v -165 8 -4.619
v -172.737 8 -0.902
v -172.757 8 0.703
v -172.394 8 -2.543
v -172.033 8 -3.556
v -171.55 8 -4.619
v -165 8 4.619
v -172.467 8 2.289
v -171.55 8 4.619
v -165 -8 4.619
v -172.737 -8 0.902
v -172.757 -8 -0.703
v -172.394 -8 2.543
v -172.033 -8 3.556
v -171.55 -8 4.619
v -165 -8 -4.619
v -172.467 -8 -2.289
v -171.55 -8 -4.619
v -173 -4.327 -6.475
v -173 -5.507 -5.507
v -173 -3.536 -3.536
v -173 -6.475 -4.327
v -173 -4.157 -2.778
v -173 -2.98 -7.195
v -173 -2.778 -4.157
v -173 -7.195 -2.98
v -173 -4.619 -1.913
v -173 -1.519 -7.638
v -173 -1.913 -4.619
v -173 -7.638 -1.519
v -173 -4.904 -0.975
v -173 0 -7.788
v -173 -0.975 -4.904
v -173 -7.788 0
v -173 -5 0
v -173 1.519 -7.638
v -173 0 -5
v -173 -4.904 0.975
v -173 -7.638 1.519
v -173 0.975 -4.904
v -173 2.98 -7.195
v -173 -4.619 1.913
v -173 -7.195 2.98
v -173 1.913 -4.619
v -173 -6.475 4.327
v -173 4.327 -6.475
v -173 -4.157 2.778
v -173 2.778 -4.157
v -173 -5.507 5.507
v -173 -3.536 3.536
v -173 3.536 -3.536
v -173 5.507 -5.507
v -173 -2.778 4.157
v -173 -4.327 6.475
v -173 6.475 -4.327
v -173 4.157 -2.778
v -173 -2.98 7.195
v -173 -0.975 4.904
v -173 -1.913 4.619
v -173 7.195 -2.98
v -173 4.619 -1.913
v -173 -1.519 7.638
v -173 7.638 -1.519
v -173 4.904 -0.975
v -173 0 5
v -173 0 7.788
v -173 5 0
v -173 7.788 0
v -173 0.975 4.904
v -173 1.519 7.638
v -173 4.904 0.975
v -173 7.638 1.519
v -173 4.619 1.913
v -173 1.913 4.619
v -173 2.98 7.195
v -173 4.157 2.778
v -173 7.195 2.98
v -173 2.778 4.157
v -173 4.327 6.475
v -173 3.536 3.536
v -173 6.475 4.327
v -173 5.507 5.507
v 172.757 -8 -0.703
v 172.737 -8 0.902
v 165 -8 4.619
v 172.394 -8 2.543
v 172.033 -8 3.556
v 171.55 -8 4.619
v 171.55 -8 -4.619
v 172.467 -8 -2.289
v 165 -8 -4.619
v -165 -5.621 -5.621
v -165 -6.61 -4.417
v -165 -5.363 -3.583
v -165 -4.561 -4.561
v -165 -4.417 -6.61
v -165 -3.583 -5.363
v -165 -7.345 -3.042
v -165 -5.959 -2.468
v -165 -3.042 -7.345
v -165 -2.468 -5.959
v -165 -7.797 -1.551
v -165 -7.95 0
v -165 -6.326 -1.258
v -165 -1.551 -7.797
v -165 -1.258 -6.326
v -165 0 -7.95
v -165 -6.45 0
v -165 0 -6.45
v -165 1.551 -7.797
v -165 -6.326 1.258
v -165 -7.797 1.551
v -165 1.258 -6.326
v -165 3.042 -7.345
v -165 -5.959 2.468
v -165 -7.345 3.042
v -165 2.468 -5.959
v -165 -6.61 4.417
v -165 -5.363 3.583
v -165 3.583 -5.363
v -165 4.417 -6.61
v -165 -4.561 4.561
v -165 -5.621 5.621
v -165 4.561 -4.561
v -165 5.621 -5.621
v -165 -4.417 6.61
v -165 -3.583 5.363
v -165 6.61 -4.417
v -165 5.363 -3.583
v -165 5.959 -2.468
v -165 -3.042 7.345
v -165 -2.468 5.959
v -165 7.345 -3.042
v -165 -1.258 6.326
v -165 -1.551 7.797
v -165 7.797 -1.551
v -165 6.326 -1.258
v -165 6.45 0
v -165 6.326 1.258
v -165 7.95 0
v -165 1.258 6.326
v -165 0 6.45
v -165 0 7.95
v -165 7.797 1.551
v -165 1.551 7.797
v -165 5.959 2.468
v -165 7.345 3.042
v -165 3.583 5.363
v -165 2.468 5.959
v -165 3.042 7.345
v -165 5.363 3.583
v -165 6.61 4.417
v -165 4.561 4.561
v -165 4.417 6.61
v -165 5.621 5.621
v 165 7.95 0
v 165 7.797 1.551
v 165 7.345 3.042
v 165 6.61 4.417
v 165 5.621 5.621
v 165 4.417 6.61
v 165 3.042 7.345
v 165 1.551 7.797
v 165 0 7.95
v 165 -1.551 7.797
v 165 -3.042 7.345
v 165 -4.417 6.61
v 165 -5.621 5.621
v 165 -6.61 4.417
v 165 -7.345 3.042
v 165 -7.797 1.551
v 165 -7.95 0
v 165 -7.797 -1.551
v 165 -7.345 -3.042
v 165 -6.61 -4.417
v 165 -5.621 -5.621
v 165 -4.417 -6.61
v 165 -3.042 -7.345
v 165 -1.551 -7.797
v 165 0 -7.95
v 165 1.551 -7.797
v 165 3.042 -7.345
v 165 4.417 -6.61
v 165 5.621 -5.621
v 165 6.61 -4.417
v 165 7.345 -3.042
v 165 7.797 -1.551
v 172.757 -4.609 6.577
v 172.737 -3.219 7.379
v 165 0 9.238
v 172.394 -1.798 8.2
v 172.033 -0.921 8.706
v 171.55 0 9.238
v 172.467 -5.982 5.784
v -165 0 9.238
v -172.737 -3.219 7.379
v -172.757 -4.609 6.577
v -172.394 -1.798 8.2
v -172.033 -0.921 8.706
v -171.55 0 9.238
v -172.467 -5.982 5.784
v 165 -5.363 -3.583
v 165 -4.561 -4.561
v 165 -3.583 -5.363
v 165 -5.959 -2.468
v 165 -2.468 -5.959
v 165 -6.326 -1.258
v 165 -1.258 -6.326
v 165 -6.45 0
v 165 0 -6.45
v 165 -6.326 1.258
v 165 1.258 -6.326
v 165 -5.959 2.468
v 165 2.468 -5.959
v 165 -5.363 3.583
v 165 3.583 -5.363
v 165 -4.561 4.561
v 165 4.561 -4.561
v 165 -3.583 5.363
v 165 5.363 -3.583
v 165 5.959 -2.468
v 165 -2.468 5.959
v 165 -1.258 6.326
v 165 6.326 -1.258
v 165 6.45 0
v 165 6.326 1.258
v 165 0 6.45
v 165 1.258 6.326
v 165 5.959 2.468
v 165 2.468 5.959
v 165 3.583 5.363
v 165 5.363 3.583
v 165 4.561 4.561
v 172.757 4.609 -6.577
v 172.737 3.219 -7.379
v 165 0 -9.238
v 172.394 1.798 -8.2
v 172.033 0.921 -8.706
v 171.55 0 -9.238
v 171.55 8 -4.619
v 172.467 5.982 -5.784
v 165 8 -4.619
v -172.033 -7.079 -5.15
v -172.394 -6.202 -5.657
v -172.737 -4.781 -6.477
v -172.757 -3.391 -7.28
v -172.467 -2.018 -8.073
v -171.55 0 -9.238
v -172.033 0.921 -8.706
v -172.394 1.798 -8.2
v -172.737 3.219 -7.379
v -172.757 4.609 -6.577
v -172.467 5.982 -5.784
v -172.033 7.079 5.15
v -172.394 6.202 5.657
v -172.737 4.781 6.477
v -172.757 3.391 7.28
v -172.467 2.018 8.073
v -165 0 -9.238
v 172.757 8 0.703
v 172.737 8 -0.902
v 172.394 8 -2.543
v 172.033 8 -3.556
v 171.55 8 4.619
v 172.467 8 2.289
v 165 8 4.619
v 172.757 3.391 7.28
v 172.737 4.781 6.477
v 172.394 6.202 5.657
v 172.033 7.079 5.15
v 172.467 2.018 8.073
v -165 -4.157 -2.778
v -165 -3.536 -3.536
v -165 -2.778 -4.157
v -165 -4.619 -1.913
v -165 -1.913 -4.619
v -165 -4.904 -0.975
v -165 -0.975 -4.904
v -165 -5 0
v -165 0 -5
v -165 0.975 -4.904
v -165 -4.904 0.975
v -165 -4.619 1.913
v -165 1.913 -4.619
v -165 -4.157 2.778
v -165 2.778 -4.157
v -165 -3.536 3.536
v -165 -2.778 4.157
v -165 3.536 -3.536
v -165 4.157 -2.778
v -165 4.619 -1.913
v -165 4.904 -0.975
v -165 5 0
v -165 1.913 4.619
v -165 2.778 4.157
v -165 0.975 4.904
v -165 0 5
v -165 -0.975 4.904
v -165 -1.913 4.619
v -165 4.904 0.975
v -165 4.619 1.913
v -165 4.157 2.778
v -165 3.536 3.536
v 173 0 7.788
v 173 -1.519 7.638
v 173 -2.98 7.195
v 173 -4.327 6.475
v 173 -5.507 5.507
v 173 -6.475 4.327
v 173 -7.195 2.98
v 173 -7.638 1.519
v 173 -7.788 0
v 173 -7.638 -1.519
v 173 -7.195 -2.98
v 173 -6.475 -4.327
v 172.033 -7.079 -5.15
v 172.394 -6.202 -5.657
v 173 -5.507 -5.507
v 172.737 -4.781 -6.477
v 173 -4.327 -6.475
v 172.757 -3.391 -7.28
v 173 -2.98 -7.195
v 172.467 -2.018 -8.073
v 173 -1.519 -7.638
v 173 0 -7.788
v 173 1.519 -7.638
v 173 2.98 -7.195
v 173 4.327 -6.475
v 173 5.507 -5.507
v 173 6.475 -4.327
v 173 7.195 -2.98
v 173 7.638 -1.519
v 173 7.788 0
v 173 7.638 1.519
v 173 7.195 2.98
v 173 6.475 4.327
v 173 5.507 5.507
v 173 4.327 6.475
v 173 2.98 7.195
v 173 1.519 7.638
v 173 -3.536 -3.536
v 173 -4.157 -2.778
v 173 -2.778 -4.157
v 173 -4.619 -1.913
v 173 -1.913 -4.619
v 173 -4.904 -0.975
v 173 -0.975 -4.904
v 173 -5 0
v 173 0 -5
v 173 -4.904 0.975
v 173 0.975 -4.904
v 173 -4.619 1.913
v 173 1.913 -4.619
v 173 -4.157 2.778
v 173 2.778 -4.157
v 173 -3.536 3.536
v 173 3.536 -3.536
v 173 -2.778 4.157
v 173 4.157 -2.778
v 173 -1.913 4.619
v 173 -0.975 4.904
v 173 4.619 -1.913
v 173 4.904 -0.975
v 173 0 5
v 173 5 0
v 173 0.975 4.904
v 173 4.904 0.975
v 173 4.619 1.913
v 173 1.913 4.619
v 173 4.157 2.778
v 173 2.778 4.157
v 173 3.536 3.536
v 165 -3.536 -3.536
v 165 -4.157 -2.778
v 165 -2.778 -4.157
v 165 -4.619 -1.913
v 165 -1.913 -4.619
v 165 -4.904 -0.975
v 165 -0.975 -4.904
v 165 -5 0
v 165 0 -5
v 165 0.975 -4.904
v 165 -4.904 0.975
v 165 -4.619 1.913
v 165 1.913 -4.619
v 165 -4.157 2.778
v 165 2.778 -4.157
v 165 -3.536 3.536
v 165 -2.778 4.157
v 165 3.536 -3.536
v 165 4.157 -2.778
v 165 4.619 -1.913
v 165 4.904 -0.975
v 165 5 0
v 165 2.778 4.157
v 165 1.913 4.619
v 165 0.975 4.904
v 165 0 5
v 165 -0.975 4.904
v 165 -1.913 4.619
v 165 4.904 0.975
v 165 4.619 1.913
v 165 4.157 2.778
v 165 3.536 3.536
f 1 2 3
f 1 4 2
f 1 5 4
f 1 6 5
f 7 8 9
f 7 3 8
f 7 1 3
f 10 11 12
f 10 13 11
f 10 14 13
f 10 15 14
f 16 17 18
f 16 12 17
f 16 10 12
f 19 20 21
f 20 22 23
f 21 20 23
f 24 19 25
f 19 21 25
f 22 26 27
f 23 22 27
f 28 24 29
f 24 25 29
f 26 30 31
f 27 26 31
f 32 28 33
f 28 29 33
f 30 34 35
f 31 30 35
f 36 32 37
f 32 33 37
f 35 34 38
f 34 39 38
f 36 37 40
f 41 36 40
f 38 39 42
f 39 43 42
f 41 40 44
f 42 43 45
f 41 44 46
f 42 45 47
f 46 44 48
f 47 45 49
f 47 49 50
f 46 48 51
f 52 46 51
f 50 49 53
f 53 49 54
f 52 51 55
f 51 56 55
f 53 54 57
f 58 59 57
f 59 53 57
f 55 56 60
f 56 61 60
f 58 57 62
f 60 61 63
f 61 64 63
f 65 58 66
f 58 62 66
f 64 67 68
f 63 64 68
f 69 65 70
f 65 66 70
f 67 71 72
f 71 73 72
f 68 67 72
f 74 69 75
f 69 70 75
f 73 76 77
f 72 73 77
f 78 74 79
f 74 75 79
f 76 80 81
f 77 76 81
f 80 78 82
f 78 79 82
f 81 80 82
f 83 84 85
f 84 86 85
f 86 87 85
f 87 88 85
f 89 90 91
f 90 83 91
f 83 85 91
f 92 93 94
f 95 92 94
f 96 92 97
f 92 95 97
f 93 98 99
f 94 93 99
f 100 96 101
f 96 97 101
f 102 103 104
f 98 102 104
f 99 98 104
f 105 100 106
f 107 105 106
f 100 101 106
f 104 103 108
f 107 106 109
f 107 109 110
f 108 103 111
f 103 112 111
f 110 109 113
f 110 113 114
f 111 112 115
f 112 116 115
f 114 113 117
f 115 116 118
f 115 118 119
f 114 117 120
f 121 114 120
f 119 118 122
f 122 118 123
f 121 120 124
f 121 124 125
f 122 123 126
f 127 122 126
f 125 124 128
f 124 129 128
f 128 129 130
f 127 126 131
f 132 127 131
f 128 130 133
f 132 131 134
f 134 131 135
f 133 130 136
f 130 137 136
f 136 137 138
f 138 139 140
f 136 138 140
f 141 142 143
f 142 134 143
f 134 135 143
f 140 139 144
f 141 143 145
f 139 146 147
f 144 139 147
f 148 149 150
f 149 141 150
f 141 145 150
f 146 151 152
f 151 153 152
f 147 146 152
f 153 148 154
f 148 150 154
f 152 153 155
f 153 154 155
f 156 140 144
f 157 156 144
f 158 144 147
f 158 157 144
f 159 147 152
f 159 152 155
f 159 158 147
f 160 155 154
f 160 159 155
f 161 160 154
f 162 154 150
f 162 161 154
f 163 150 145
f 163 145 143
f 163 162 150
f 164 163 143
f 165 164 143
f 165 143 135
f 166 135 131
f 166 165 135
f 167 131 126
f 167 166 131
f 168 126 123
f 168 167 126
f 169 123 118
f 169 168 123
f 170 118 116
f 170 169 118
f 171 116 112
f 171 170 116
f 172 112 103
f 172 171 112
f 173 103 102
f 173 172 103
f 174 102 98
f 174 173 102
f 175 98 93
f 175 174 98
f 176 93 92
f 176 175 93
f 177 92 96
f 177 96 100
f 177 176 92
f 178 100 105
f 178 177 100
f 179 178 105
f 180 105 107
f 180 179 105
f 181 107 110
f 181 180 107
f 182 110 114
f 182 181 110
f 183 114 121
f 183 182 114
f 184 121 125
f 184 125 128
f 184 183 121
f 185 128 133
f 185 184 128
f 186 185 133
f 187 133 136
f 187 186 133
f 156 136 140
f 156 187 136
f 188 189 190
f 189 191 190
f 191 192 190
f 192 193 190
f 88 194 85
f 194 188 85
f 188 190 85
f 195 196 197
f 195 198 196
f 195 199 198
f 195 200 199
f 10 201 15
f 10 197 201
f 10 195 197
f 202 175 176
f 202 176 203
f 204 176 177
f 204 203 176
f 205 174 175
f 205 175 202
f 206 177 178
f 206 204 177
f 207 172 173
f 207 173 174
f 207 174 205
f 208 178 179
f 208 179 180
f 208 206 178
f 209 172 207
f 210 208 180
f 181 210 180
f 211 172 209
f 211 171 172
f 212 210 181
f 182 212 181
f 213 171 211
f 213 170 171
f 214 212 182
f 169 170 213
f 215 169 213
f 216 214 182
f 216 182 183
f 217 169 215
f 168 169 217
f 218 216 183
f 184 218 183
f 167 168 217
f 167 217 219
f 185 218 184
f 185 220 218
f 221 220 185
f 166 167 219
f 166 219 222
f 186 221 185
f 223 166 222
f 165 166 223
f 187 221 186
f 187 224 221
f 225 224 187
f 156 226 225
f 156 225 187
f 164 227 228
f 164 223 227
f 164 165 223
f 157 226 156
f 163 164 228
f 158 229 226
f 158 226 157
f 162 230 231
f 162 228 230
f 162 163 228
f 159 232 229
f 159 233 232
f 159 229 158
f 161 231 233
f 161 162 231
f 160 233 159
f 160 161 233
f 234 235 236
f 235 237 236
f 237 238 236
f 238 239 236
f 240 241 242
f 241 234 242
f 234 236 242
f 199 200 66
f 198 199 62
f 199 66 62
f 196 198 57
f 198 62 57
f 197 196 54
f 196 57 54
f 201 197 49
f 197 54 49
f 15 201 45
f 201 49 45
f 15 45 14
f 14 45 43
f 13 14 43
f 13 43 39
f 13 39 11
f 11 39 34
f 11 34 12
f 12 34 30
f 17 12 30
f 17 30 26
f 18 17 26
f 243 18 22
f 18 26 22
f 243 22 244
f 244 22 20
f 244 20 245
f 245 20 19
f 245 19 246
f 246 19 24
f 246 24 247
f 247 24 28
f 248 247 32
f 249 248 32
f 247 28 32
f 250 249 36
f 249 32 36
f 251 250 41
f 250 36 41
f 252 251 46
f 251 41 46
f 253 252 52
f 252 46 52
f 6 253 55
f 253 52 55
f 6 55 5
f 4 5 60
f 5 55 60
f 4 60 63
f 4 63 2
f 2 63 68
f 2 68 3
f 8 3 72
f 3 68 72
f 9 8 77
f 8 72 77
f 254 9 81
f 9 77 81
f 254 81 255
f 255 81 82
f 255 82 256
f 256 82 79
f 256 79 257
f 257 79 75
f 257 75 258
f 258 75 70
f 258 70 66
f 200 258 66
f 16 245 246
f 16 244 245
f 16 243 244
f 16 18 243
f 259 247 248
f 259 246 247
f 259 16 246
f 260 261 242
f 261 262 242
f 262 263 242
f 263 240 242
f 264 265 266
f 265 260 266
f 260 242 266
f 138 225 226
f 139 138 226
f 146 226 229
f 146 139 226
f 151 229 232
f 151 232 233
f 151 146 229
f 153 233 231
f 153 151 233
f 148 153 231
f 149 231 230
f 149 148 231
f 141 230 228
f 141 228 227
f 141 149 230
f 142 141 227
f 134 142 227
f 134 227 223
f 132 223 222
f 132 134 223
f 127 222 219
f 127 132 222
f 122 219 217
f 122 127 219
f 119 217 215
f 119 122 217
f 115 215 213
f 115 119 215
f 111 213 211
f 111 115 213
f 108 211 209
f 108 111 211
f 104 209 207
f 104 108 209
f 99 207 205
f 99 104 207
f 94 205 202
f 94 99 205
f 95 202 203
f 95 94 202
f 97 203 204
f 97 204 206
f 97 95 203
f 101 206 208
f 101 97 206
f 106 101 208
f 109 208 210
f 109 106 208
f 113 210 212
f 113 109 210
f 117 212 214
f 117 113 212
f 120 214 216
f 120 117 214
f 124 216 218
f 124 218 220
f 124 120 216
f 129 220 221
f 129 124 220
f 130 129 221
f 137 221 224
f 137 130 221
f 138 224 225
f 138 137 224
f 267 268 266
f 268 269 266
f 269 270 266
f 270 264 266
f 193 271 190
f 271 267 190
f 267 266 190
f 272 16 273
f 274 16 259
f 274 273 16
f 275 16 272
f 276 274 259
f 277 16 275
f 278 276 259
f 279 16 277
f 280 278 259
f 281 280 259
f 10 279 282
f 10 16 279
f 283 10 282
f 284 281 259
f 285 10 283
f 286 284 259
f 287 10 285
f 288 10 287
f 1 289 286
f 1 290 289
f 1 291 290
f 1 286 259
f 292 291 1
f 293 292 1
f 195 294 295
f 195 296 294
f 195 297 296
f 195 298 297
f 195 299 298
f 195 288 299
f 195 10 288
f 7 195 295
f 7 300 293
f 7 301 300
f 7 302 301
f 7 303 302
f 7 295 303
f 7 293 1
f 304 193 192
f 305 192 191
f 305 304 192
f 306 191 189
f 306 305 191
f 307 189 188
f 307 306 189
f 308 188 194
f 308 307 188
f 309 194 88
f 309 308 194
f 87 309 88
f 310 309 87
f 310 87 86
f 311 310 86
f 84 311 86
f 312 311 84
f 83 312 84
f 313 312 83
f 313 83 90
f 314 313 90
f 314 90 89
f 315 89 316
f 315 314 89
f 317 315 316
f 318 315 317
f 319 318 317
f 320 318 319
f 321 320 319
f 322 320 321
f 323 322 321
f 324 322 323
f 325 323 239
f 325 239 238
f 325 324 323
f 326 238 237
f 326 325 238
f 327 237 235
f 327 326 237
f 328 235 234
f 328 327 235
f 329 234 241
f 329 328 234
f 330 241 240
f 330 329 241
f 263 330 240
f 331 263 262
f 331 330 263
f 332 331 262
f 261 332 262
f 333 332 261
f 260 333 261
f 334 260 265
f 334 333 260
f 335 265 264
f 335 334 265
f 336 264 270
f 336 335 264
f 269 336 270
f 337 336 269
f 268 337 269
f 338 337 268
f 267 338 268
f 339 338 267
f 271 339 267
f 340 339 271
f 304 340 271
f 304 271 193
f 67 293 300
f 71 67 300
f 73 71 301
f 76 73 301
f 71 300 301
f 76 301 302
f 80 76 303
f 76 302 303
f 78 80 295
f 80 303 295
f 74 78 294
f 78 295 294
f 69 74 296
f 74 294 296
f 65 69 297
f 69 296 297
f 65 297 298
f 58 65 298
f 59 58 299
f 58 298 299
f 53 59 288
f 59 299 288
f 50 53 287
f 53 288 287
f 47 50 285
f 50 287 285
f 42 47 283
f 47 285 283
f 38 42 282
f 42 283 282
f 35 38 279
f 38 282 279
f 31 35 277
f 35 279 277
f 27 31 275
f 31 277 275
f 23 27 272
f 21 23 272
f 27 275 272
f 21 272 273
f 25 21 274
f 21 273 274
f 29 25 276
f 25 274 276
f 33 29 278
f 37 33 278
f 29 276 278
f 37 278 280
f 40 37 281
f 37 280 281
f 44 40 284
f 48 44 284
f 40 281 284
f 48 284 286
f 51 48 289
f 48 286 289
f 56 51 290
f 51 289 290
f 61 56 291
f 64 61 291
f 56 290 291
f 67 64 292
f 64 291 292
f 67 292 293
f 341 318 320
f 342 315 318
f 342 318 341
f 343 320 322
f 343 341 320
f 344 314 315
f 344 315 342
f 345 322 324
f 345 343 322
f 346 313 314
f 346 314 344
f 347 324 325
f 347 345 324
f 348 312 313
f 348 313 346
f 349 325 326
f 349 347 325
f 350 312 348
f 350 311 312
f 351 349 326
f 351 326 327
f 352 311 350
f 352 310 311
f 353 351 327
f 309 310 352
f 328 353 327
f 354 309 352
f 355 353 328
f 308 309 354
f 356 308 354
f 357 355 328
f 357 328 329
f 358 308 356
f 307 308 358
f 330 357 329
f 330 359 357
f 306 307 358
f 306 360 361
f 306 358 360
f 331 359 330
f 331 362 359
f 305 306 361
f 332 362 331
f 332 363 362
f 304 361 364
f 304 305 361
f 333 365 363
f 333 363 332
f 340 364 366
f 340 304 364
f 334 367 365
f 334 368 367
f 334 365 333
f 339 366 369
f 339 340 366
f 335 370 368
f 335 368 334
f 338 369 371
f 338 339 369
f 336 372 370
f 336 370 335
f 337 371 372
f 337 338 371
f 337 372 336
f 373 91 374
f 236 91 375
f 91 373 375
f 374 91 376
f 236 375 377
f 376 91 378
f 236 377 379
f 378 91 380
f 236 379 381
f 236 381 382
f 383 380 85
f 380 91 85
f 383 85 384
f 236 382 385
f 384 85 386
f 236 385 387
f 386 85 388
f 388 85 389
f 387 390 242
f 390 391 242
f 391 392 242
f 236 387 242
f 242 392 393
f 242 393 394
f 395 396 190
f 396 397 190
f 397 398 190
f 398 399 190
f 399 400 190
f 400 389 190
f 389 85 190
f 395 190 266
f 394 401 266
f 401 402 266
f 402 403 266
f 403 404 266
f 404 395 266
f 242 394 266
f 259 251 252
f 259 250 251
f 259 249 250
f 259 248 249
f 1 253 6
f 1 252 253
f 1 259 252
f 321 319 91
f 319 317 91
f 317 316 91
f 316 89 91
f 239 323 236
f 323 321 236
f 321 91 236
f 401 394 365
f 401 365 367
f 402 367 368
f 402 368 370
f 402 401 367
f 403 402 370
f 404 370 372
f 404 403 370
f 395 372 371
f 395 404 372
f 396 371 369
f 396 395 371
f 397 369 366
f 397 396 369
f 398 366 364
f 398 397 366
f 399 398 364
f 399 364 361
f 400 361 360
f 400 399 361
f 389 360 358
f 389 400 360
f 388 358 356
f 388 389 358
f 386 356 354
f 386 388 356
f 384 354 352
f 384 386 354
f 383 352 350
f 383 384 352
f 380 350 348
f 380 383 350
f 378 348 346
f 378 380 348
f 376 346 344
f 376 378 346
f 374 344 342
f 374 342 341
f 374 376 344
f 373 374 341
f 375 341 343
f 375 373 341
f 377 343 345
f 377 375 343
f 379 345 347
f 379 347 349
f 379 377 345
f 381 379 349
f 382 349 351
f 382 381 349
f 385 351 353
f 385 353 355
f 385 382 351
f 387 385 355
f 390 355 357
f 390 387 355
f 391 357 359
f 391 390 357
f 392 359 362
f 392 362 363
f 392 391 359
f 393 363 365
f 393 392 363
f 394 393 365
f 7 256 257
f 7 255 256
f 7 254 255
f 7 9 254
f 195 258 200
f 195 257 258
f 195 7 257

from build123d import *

# Parameters (mm, degrees)
F0_R     = 7.95
F0_R_2   = 6.45
F1_DEPTH = 165
F2_R     = 5
F3_DEPTH = 8


with BuildPart() as f1:
    # F0 (on Right) → F1 (new body, symmetric)
    with BuildSketch(Plane.YZ):
        Circle(F0_R)
        Circle(F0_R_2, mode=Mode.SUBTRACT)
    extrude(amount=F1_DEPTH, both=True)


with BuildPart() as f3:
    # F2 (on face) → F3 (new body)
    with BuildSketch(Plane.YZ.offset(165)):
        Polygon((8, -4.618802), (8, 4.618802), (0, 9.237604), (-8, 4.618802), (-8, -4.618802), (0, -9.237604), align=None)
        Circle(F2_R, mode=Mode.SUBTRACT)
    extrude(amount=F3_DEPTH)

    # F4 (on Front) → F5 (revolve, cut)
    with BuildSketch(Plane.XZ):
        Polygon((173, 7.788003), (173, 9.237604), (171.550399, 9.237604), align=None)
    revolve(axis=Axis((116.156034, 0, 0), (1, 0, 0)), mode=Mode.SUBTRACT)


with BuildPart() as f6_1:
    # F6: instance of F3
    add(f3.part.mirror(Plane.YZ))


solid = Compound([f1.part, f3.part, f6_1.part])
